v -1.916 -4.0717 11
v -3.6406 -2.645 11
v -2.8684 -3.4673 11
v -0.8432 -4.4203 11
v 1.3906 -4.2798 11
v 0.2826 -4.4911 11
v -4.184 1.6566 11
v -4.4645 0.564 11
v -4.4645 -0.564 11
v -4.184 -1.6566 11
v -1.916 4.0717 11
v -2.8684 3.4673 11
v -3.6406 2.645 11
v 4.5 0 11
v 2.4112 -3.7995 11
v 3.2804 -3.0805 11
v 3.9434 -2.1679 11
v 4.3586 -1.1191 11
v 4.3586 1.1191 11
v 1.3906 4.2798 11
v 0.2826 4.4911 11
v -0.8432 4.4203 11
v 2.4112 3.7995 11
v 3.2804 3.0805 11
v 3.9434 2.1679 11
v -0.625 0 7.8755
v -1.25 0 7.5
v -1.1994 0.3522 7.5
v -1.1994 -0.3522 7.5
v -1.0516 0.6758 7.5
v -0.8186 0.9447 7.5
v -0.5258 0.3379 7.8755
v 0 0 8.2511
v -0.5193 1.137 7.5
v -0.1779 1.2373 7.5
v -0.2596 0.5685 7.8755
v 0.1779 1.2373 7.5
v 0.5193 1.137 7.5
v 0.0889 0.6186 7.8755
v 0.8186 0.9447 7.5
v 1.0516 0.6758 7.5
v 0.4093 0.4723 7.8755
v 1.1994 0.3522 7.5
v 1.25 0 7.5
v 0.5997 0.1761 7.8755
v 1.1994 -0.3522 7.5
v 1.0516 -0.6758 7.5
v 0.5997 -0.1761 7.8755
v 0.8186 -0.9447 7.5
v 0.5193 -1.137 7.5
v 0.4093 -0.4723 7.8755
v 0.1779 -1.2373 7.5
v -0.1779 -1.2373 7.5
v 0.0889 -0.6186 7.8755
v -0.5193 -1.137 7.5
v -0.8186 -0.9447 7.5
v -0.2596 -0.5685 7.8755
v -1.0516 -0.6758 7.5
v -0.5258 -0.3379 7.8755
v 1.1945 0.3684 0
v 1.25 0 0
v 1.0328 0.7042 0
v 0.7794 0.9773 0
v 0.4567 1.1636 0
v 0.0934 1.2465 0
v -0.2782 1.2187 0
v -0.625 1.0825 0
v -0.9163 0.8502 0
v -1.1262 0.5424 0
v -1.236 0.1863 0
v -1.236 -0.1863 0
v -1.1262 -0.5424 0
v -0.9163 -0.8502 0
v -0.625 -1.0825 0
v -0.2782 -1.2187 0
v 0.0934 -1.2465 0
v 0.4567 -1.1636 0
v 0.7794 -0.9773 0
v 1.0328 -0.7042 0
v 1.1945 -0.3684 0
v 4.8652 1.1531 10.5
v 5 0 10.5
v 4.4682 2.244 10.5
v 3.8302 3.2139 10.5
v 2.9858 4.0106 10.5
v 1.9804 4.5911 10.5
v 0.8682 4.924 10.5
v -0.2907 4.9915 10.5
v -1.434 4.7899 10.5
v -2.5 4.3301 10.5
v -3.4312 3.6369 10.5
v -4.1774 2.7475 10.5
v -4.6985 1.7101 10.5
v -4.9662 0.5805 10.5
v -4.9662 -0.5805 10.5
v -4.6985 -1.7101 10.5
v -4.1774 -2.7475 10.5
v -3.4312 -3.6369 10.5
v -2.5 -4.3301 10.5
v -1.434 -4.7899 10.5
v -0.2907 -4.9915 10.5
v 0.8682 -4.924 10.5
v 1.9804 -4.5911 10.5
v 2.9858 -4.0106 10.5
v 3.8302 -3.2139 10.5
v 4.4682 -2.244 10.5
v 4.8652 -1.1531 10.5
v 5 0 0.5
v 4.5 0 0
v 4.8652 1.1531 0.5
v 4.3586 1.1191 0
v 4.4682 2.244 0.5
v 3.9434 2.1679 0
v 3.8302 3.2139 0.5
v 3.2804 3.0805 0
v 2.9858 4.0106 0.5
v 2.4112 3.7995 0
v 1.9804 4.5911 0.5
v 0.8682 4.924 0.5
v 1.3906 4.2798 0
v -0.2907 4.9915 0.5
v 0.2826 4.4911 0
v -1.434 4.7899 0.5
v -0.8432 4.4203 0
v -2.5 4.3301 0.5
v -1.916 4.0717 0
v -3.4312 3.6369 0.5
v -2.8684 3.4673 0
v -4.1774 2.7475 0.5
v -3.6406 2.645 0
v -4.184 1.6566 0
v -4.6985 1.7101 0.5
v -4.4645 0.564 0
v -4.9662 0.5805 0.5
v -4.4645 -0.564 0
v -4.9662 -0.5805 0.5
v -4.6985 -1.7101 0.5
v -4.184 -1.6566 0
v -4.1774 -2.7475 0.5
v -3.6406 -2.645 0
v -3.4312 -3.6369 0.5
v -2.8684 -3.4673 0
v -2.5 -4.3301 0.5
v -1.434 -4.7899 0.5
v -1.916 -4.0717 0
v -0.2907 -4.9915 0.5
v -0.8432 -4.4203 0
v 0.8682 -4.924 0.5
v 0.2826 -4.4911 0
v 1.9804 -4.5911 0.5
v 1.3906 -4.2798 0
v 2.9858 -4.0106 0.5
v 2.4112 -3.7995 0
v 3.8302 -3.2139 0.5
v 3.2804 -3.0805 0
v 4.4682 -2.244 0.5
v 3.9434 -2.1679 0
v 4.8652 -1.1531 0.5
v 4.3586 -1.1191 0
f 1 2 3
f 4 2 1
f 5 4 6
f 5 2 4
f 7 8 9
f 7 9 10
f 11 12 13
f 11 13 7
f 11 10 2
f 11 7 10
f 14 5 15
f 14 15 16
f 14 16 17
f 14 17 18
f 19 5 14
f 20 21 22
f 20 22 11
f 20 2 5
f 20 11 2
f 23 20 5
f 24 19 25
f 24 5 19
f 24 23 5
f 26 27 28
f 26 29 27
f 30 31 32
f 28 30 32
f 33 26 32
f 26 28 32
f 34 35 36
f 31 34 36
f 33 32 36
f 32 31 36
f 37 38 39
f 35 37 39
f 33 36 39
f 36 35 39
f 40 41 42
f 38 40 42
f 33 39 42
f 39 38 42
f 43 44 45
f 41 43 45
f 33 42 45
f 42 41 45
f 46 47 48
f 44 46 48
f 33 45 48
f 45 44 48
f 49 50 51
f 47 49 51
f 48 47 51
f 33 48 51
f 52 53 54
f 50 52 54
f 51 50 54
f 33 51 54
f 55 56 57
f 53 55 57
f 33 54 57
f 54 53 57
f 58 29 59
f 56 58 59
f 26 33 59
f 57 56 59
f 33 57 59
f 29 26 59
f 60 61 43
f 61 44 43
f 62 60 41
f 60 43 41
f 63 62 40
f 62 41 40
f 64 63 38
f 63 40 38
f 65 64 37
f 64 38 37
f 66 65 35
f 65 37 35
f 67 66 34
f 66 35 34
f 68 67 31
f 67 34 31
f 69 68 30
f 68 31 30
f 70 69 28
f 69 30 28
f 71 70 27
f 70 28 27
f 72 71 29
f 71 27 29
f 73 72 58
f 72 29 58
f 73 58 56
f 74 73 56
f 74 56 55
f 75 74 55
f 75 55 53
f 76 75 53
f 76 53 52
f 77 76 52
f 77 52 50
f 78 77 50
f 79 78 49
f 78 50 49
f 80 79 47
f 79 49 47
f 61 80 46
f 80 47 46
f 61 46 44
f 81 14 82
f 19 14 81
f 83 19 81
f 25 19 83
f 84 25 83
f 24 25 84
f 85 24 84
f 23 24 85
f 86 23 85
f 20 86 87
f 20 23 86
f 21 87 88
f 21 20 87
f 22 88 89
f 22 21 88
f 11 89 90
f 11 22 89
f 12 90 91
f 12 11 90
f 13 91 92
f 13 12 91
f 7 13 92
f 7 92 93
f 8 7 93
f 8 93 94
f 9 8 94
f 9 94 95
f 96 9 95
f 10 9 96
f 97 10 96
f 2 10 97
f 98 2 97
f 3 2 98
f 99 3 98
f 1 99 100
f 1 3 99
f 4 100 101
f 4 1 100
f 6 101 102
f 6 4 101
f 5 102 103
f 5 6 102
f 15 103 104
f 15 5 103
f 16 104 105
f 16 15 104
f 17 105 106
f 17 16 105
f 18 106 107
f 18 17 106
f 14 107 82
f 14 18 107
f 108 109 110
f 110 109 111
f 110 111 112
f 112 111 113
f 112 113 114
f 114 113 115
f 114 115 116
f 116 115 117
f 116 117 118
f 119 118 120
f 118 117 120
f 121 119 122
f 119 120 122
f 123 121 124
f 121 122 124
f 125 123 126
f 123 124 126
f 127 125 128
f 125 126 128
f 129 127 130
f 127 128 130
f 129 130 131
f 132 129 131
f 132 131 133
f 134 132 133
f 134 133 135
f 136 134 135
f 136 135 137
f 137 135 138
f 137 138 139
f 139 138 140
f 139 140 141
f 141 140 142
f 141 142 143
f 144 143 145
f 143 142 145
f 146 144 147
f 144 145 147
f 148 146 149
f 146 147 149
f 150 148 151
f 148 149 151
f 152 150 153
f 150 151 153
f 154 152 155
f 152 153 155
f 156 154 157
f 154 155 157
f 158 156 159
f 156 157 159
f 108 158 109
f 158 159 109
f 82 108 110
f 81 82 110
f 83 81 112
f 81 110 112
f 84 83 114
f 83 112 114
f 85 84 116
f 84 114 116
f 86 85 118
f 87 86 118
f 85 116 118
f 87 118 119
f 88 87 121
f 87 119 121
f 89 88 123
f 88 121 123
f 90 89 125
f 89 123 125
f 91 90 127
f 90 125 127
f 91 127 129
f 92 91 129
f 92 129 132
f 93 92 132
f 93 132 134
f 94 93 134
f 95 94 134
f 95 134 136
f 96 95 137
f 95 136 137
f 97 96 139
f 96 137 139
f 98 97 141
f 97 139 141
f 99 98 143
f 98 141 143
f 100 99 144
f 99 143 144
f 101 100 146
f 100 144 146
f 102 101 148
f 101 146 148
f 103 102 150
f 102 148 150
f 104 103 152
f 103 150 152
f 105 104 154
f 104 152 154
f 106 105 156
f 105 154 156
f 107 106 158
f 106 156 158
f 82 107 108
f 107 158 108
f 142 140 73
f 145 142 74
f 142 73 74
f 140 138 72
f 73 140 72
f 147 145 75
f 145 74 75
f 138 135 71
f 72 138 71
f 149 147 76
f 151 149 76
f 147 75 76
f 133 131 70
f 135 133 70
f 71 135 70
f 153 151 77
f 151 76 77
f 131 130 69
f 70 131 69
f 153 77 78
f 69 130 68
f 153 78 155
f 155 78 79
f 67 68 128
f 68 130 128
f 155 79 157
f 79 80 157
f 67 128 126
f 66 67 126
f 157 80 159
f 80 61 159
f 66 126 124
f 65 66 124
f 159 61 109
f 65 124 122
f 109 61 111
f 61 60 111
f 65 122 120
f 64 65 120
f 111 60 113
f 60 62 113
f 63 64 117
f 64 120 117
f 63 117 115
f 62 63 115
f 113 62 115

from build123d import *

# Parameters (mm, degrees)
SKETCH1_R             = 5
BOSS_EXTRUDE1_DEPTH   = 11
M3_TAPPED_HOLE1_D     = 2.5
M3_TAPPED_HOLE1_DEPTH = 7.5
M3_TAPPED_HOLE1_TIP   = 0.751075774
CHAMFER2_SIZE         = 0.5


with BuildPart() as part:
    # Sketch1 → Boss-Extrude1 (new body)
    with BuildSketch(Plane.XY):
        Circle(SKETCH1_R)
    extrude(amount=BOSS_EXTRUDE1_DEPTH)

    # M3 Tapped Hole1
    with Locations(Plane(origin=(0, 0, 0), x_dir=(-1, 0, 0), z_dir=(0, 0, -1))):
        with Locations((0, 0)):
            Hole(M3_TAPPED_HOLE1_D / 2, depth=M3_TAPPED_HOLE1_DEPTH)
            with Locations((0, 0, -(M3_TAPPED_HOLE1_DEPTH + M3_TAPPED_HOLE1_TIP / 2))):  # 118° drill point
                Cone(0, M3_TAPPED_HOLE1_D / 2, M3_TAPPED_HOLE1_TIP, mode=Mode.SUBTRACT)

    # Chamfer2
    chamfer2_edges = [part.edges().sort_by_distance(p)[0] for p in [
        (-5, 0, 0),
        (-5, 0, 11),
    ]]
    chamfer(chamfer2_edges, length=CHAMFER2_SIZE)


solid = part.part
